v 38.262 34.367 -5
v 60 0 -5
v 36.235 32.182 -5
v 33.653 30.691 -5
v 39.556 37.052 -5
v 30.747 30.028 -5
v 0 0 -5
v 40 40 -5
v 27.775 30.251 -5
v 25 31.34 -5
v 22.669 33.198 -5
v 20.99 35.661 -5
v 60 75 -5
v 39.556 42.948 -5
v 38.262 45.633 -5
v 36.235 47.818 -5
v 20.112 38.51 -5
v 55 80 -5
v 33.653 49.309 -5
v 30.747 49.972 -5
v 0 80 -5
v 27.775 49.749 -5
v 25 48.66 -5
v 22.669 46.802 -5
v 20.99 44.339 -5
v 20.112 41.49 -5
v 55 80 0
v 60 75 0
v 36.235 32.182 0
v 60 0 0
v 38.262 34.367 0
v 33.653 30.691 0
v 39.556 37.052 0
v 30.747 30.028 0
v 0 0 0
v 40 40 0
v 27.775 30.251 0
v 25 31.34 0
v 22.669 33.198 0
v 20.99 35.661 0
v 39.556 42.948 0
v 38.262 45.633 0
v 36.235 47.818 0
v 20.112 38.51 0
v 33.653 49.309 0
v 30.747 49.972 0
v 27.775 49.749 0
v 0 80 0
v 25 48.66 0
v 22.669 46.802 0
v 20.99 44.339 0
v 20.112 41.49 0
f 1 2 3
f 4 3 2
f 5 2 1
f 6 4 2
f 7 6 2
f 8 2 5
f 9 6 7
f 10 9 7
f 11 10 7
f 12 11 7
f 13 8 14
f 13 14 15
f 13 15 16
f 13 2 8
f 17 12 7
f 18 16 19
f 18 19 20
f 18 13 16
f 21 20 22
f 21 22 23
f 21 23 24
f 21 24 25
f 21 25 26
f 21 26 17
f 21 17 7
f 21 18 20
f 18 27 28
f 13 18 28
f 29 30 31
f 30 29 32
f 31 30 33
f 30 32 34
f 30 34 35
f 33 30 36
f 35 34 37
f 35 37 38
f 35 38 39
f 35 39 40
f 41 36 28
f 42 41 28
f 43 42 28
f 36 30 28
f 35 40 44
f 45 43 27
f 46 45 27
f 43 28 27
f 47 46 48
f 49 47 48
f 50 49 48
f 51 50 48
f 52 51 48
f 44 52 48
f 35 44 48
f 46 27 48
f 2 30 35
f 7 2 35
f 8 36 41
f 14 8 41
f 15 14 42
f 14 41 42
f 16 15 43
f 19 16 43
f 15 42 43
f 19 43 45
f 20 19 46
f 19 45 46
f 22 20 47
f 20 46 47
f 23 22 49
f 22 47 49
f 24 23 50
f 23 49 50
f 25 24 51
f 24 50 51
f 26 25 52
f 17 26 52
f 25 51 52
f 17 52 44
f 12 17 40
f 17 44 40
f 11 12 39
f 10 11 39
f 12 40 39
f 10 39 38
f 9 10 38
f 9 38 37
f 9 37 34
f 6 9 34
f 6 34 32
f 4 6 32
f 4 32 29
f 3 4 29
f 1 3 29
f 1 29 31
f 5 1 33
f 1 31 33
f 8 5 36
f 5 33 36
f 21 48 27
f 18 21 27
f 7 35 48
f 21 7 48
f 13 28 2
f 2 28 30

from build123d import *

# Parameters (mm, degrees)
SKETCH1_R      = 10
EXTRUDE1_DEPTH = 5


with BuildPart() as part:
    # Sketch1 → Extrude1 (new body)
    with BuildSketch(Plane.XY):
        Polygon((55, 80), (60, 75), (60, 0), (0, 0), (0, 80), align=None)
        with Locations((30, 40)):
            Circle(SKETCH1_R, mode=Mode.SUBTRACT)
    extrude(amount=-EXTRUDE1_DEPTH)


solid = part.part
